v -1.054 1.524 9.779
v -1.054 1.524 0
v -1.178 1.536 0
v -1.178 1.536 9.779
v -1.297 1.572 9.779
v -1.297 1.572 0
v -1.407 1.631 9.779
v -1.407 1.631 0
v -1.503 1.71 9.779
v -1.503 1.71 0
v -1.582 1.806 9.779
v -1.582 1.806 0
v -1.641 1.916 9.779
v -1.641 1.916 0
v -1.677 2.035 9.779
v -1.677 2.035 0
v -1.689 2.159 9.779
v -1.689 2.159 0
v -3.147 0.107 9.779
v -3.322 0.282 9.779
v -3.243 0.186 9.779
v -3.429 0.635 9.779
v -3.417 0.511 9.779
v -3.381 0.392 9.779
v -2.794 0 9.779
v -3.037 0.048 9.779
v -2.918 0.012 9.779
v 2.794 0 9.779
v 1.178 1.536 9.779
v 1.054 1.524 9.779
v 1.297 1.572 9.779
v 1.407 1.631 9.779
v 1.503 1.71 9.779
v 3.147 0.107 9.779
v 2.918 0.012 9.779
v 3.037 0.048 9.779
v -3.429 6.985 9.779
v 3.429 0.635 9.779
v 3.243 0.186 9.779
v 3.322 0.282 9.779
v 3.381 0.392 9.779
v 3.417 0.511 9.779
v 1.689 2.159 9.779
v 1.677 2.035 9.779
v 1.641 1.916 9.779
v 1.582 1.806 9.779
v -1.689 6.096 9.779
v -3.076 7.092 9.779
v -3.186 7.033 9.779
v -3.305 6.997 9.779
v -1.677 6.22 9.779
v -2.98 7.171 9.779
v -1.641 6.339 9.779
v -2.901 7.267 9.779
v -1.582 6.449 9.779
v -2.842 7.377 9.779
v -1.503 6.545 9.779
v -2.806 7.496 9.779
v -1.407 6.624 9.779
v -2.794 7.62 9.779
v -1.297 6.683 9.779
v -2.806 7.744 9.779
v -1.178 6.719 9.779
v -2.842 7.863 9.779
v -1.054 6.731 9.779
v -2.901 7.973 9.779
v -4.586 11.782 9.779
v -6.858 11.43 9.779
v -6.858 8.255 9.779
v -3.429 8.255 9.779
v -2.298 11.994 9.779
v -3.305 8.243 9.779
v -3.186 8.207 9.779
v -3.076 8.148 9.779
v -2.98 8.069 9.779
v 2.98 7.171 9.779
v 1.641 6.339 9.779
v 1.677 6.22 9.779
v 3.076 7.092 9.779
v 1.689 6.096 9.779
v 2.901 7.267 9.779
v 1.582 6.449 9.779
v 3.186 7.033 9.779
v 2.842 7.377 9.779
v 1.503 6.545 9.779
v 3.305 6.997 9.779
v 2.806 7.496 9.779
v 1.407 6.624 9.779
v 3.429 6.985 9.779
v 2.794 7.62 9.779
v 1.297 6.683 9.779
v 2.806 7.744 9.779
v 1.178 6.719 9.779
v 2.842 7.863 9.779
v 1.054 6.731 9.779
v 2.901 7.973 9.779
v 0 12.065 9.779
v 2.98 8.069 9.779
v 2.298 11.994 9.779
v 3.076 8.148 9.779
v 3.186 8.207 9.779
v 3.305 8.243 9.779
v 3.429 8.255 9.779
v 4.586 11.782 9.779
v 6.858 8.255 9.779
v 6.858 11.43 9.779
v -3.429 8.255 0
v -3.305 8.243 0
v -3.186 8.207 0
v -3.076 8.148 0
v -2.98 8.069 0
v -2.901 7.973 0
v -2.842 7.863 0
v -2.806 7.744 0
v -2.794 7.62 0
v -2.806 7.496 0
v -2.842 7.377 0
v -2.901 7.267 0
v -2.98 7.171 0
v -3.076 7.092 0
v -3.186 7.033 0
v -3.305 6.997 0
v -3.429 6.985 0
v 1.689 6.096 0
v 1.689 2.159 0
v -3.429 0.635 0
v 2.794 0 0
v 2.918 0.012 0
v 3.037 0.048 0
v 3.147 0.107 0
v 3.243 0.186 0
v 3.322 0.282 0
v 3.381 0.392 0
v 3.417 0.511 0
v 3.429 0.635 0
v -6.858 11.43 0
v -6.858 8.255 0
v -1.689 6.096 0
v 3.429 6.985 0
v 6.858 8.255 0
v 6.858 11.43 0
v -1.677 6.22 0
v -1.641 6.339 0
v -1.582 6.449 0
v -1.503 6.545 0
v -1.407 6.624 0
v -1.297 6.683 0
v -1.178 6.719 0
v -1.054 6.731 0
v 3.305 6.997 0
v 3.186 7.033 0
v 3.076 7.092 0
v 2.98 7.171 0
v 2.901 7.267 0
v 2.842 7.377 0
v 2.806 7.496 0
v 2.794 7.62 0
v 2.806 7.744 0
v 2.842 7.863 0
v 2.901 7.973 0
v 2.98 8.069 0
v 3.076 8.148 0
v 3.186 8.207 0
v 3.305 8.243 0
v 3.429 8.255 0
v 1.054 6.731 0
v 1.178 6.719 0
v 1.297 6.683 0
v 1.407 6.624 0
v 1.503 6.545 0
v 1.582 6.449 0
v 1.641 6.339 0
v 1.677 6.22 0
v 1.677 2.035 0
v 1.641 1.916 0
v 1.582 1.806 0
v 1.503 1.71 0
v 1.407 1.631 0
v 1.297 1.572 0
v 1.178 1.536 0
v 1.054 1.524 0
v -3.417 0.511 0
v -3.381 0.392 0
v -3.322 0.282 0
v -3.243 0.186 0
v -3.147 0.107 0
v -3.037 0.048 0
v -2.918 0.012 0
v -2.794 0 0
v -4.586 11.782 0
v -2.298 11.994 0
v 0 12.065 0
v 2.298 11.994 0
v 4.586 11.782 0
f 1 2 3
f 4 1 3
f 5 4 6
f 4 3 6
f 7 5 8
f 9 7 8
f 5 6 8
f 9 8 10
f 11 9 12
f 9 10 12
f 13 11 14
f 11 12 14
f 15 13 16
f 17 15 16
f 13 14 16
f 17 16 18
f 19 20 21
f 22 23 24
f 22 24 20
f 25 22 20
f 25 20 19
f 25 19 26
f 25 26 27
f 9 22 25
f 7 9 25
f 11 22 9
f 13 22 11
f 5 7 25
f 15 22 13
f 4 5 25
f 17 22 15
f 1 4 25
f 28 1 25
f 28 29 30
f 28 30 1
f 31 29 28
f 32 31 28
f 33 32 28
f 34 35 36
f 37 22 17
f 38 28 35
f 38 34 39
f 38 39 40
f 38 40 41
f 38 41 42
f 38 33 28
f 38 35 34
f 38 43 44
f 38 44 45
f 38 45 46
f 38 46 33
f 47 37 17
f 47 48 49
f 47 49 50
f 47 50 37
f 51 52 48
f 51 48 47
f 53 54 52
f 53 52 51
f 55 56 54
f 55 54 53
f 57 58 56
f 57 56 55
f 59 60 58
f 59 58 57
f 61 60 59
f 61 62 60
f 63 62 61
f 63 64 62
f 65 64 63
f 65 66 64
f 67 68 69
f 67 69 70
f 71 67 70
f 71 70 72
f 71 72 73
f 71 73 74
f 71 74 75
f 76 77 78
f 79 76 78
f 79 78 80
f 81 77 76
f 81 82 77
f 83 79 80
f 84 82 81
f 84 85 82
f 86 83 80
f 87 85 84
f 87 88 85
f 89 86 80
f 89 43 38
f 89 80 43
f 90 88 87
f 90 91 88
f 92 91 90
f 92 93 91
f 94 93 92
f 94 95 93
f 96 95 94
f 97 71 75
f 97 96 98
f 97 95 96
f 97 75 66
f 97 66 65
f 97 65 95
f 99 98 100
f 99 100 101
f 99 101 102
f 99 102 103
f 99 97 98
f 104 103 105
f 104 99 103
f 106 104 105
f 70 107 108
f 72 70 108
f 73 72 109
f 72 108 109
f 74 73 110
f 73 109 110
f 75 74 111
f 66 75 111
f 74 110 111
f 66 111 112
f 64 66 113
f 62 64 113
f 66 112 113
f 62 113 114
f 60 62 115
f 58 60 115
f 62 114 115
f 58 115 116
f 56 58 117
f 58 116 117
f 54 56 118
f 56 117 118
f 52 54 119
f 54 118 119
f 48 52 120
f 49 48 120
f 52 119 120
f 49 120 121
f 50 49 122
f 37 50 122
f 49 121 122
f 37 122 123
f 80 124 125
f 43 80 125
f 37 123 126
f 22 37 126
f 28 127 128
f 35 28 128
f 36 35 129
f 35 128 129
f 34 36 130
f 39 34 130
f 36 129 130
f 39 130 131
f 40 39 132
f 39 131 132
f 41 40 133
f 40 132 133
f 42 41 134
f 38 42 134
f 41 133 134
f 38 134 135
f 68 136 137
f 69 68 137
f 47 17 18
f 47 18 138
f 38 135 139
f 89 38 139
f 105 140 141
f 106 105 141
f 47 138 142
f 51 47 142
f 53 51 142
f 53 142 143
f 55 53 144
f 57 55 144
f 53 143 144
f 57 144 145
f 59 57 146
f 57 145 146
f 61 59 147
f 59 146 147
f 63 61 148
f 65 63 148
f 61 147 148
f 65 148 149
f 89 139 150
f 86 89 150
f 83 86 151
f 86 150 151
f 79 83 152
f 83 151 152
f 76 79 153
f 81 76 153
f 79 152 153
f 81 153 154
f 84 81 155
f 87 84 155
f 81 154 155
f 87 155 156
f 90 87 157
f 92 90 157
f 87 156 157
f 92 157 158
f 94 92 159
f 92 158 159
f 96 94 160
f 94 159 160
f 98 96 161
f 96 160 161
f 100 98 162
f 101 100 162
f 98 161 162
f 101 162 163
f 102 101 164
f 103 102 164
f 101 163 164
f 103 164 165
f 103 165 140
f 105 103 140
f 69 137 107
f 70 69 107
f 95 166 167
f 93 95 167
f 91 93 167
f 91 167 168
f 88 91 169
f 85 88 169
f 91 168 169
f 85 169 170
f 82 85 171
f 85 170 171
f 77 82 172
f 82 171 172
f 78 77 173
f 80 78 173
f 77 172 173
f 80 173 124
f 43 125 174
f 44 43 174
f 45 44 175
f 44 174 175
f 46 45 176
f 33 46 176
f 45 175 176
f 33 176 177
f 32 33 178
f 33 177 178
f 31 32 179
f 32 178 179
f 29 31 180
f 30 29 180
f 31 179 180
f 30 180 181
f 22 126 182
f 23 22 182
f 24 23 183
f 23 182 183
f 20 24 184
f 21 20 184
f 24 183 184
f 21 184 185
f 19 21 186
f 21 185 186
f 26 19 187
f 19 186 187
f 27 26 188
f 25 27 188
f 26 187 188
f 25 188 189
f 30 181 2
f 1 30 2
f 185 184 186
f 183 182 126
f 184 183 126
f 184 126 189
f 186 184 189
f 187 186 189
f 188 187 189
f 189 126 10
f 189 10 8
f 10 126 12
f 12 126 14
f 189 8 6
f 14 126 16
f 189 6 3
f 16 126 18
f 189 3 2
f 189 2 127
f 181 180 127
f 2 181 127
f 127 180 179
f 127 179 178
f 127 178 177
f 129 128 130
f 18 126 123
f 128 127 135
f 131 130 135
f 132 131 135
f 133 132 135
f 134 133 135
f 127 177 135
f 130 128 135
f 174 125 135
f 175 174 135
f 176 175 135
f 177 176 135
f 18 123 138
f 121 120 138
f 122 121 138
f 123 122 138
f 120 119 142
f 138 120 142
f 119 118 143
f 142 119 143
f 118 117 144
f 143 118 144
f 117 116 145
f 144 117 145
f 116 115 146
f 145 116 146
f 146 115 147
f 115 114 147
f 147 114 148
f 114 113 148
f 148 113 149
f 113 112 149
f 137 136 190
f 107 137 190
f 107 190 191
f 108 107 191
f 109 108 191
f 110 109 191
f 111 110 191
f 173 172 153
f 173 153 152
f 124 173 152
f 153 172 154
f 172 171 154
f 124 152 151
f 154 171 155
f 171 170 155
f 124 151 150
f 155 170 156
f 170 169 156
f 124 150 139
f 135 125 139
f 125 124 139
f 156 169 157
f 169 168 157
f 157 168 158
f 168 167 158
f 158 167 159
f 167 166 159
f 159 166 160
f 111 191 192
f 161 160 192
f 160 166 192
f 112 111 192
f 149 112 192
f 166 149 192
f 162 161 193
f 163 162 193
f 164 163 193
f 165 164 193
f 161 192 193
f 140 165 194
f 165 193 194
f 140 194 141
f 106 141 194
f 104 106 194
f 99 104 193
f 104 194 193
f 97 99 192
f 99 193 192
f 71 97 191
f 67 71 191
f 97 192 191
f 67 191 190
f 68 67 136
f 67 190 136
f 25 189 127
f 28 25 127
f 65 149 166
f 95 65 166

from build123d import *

# Parameters (mm, degrees)
F1_DEPTH = 9.779


with BuildPart() as f1:
    # F0 (on Top) → F1 (new body)
    with BuildSketch(Plane.XY):
        with BuildLine():
            ThreePointArc((-3.429, 0.635), (-3.243013, 0.185987), (-2.794, 0))
            Line((-2.794, 0), (2.794, 0))
            ThreePointArc((2.794, 0), (3.243013, 0.185987), (3.429, 0.635))
            Line((3.429, 0.635), (3.429, 6.985))
            ThreePointArc((3.429, 6.985), (2.794, 7.62), (3.429, 8.255))
            Line((3.429, 8.255), (6.858, 8.255))
            Line((6.858, 8.255), (6.858, 11.43))
            ThreePointArc((6.858, 11.43), (0, 12.065), (-6.858, 11.43))
            Line((-6.858, 11.43), (-6.858, 8.255))
            Line((-6.858, 8.255), (-3.429, 8.255))
            ThreePointArc((-3.429, 8.255), (-2.794, 7.62), (-3.429, 6.985))
            Line((-3.429, 6.985), (-3.429, 0.635))
        make_face()
        with BuildLine():
            ThreePointArc((-1.6891, 6.096), (-1.503113, 6.545013), (-1.0541, 6.731))
            Line((-1.0541, 6.731), (1.0541, 6.731))
            ThreePointArc((1.0541, 6.731), (1.503113, 6.545013), (1.6891, 6.096))
            Line((1.6891, 6.096), (1.6891, 2.159))
            ThreePointArc((1.6891, 2.159), (1.503113, 1.709987), (1.0541, 1.524))
            Line((1.0541, 1.524), (-1.0541, 1.524))
            ThreePointArc((-1.0541, 1.524), (-1.503113, 1.709987), (-1.6891, 2.159))
            Line((-1.6891, 2.159), (-1.6891, 6.096))
        make_face(mode=Mode.SUBTRACT)
    extrude(amount=F1_DEPTH)


solid = f1.part
